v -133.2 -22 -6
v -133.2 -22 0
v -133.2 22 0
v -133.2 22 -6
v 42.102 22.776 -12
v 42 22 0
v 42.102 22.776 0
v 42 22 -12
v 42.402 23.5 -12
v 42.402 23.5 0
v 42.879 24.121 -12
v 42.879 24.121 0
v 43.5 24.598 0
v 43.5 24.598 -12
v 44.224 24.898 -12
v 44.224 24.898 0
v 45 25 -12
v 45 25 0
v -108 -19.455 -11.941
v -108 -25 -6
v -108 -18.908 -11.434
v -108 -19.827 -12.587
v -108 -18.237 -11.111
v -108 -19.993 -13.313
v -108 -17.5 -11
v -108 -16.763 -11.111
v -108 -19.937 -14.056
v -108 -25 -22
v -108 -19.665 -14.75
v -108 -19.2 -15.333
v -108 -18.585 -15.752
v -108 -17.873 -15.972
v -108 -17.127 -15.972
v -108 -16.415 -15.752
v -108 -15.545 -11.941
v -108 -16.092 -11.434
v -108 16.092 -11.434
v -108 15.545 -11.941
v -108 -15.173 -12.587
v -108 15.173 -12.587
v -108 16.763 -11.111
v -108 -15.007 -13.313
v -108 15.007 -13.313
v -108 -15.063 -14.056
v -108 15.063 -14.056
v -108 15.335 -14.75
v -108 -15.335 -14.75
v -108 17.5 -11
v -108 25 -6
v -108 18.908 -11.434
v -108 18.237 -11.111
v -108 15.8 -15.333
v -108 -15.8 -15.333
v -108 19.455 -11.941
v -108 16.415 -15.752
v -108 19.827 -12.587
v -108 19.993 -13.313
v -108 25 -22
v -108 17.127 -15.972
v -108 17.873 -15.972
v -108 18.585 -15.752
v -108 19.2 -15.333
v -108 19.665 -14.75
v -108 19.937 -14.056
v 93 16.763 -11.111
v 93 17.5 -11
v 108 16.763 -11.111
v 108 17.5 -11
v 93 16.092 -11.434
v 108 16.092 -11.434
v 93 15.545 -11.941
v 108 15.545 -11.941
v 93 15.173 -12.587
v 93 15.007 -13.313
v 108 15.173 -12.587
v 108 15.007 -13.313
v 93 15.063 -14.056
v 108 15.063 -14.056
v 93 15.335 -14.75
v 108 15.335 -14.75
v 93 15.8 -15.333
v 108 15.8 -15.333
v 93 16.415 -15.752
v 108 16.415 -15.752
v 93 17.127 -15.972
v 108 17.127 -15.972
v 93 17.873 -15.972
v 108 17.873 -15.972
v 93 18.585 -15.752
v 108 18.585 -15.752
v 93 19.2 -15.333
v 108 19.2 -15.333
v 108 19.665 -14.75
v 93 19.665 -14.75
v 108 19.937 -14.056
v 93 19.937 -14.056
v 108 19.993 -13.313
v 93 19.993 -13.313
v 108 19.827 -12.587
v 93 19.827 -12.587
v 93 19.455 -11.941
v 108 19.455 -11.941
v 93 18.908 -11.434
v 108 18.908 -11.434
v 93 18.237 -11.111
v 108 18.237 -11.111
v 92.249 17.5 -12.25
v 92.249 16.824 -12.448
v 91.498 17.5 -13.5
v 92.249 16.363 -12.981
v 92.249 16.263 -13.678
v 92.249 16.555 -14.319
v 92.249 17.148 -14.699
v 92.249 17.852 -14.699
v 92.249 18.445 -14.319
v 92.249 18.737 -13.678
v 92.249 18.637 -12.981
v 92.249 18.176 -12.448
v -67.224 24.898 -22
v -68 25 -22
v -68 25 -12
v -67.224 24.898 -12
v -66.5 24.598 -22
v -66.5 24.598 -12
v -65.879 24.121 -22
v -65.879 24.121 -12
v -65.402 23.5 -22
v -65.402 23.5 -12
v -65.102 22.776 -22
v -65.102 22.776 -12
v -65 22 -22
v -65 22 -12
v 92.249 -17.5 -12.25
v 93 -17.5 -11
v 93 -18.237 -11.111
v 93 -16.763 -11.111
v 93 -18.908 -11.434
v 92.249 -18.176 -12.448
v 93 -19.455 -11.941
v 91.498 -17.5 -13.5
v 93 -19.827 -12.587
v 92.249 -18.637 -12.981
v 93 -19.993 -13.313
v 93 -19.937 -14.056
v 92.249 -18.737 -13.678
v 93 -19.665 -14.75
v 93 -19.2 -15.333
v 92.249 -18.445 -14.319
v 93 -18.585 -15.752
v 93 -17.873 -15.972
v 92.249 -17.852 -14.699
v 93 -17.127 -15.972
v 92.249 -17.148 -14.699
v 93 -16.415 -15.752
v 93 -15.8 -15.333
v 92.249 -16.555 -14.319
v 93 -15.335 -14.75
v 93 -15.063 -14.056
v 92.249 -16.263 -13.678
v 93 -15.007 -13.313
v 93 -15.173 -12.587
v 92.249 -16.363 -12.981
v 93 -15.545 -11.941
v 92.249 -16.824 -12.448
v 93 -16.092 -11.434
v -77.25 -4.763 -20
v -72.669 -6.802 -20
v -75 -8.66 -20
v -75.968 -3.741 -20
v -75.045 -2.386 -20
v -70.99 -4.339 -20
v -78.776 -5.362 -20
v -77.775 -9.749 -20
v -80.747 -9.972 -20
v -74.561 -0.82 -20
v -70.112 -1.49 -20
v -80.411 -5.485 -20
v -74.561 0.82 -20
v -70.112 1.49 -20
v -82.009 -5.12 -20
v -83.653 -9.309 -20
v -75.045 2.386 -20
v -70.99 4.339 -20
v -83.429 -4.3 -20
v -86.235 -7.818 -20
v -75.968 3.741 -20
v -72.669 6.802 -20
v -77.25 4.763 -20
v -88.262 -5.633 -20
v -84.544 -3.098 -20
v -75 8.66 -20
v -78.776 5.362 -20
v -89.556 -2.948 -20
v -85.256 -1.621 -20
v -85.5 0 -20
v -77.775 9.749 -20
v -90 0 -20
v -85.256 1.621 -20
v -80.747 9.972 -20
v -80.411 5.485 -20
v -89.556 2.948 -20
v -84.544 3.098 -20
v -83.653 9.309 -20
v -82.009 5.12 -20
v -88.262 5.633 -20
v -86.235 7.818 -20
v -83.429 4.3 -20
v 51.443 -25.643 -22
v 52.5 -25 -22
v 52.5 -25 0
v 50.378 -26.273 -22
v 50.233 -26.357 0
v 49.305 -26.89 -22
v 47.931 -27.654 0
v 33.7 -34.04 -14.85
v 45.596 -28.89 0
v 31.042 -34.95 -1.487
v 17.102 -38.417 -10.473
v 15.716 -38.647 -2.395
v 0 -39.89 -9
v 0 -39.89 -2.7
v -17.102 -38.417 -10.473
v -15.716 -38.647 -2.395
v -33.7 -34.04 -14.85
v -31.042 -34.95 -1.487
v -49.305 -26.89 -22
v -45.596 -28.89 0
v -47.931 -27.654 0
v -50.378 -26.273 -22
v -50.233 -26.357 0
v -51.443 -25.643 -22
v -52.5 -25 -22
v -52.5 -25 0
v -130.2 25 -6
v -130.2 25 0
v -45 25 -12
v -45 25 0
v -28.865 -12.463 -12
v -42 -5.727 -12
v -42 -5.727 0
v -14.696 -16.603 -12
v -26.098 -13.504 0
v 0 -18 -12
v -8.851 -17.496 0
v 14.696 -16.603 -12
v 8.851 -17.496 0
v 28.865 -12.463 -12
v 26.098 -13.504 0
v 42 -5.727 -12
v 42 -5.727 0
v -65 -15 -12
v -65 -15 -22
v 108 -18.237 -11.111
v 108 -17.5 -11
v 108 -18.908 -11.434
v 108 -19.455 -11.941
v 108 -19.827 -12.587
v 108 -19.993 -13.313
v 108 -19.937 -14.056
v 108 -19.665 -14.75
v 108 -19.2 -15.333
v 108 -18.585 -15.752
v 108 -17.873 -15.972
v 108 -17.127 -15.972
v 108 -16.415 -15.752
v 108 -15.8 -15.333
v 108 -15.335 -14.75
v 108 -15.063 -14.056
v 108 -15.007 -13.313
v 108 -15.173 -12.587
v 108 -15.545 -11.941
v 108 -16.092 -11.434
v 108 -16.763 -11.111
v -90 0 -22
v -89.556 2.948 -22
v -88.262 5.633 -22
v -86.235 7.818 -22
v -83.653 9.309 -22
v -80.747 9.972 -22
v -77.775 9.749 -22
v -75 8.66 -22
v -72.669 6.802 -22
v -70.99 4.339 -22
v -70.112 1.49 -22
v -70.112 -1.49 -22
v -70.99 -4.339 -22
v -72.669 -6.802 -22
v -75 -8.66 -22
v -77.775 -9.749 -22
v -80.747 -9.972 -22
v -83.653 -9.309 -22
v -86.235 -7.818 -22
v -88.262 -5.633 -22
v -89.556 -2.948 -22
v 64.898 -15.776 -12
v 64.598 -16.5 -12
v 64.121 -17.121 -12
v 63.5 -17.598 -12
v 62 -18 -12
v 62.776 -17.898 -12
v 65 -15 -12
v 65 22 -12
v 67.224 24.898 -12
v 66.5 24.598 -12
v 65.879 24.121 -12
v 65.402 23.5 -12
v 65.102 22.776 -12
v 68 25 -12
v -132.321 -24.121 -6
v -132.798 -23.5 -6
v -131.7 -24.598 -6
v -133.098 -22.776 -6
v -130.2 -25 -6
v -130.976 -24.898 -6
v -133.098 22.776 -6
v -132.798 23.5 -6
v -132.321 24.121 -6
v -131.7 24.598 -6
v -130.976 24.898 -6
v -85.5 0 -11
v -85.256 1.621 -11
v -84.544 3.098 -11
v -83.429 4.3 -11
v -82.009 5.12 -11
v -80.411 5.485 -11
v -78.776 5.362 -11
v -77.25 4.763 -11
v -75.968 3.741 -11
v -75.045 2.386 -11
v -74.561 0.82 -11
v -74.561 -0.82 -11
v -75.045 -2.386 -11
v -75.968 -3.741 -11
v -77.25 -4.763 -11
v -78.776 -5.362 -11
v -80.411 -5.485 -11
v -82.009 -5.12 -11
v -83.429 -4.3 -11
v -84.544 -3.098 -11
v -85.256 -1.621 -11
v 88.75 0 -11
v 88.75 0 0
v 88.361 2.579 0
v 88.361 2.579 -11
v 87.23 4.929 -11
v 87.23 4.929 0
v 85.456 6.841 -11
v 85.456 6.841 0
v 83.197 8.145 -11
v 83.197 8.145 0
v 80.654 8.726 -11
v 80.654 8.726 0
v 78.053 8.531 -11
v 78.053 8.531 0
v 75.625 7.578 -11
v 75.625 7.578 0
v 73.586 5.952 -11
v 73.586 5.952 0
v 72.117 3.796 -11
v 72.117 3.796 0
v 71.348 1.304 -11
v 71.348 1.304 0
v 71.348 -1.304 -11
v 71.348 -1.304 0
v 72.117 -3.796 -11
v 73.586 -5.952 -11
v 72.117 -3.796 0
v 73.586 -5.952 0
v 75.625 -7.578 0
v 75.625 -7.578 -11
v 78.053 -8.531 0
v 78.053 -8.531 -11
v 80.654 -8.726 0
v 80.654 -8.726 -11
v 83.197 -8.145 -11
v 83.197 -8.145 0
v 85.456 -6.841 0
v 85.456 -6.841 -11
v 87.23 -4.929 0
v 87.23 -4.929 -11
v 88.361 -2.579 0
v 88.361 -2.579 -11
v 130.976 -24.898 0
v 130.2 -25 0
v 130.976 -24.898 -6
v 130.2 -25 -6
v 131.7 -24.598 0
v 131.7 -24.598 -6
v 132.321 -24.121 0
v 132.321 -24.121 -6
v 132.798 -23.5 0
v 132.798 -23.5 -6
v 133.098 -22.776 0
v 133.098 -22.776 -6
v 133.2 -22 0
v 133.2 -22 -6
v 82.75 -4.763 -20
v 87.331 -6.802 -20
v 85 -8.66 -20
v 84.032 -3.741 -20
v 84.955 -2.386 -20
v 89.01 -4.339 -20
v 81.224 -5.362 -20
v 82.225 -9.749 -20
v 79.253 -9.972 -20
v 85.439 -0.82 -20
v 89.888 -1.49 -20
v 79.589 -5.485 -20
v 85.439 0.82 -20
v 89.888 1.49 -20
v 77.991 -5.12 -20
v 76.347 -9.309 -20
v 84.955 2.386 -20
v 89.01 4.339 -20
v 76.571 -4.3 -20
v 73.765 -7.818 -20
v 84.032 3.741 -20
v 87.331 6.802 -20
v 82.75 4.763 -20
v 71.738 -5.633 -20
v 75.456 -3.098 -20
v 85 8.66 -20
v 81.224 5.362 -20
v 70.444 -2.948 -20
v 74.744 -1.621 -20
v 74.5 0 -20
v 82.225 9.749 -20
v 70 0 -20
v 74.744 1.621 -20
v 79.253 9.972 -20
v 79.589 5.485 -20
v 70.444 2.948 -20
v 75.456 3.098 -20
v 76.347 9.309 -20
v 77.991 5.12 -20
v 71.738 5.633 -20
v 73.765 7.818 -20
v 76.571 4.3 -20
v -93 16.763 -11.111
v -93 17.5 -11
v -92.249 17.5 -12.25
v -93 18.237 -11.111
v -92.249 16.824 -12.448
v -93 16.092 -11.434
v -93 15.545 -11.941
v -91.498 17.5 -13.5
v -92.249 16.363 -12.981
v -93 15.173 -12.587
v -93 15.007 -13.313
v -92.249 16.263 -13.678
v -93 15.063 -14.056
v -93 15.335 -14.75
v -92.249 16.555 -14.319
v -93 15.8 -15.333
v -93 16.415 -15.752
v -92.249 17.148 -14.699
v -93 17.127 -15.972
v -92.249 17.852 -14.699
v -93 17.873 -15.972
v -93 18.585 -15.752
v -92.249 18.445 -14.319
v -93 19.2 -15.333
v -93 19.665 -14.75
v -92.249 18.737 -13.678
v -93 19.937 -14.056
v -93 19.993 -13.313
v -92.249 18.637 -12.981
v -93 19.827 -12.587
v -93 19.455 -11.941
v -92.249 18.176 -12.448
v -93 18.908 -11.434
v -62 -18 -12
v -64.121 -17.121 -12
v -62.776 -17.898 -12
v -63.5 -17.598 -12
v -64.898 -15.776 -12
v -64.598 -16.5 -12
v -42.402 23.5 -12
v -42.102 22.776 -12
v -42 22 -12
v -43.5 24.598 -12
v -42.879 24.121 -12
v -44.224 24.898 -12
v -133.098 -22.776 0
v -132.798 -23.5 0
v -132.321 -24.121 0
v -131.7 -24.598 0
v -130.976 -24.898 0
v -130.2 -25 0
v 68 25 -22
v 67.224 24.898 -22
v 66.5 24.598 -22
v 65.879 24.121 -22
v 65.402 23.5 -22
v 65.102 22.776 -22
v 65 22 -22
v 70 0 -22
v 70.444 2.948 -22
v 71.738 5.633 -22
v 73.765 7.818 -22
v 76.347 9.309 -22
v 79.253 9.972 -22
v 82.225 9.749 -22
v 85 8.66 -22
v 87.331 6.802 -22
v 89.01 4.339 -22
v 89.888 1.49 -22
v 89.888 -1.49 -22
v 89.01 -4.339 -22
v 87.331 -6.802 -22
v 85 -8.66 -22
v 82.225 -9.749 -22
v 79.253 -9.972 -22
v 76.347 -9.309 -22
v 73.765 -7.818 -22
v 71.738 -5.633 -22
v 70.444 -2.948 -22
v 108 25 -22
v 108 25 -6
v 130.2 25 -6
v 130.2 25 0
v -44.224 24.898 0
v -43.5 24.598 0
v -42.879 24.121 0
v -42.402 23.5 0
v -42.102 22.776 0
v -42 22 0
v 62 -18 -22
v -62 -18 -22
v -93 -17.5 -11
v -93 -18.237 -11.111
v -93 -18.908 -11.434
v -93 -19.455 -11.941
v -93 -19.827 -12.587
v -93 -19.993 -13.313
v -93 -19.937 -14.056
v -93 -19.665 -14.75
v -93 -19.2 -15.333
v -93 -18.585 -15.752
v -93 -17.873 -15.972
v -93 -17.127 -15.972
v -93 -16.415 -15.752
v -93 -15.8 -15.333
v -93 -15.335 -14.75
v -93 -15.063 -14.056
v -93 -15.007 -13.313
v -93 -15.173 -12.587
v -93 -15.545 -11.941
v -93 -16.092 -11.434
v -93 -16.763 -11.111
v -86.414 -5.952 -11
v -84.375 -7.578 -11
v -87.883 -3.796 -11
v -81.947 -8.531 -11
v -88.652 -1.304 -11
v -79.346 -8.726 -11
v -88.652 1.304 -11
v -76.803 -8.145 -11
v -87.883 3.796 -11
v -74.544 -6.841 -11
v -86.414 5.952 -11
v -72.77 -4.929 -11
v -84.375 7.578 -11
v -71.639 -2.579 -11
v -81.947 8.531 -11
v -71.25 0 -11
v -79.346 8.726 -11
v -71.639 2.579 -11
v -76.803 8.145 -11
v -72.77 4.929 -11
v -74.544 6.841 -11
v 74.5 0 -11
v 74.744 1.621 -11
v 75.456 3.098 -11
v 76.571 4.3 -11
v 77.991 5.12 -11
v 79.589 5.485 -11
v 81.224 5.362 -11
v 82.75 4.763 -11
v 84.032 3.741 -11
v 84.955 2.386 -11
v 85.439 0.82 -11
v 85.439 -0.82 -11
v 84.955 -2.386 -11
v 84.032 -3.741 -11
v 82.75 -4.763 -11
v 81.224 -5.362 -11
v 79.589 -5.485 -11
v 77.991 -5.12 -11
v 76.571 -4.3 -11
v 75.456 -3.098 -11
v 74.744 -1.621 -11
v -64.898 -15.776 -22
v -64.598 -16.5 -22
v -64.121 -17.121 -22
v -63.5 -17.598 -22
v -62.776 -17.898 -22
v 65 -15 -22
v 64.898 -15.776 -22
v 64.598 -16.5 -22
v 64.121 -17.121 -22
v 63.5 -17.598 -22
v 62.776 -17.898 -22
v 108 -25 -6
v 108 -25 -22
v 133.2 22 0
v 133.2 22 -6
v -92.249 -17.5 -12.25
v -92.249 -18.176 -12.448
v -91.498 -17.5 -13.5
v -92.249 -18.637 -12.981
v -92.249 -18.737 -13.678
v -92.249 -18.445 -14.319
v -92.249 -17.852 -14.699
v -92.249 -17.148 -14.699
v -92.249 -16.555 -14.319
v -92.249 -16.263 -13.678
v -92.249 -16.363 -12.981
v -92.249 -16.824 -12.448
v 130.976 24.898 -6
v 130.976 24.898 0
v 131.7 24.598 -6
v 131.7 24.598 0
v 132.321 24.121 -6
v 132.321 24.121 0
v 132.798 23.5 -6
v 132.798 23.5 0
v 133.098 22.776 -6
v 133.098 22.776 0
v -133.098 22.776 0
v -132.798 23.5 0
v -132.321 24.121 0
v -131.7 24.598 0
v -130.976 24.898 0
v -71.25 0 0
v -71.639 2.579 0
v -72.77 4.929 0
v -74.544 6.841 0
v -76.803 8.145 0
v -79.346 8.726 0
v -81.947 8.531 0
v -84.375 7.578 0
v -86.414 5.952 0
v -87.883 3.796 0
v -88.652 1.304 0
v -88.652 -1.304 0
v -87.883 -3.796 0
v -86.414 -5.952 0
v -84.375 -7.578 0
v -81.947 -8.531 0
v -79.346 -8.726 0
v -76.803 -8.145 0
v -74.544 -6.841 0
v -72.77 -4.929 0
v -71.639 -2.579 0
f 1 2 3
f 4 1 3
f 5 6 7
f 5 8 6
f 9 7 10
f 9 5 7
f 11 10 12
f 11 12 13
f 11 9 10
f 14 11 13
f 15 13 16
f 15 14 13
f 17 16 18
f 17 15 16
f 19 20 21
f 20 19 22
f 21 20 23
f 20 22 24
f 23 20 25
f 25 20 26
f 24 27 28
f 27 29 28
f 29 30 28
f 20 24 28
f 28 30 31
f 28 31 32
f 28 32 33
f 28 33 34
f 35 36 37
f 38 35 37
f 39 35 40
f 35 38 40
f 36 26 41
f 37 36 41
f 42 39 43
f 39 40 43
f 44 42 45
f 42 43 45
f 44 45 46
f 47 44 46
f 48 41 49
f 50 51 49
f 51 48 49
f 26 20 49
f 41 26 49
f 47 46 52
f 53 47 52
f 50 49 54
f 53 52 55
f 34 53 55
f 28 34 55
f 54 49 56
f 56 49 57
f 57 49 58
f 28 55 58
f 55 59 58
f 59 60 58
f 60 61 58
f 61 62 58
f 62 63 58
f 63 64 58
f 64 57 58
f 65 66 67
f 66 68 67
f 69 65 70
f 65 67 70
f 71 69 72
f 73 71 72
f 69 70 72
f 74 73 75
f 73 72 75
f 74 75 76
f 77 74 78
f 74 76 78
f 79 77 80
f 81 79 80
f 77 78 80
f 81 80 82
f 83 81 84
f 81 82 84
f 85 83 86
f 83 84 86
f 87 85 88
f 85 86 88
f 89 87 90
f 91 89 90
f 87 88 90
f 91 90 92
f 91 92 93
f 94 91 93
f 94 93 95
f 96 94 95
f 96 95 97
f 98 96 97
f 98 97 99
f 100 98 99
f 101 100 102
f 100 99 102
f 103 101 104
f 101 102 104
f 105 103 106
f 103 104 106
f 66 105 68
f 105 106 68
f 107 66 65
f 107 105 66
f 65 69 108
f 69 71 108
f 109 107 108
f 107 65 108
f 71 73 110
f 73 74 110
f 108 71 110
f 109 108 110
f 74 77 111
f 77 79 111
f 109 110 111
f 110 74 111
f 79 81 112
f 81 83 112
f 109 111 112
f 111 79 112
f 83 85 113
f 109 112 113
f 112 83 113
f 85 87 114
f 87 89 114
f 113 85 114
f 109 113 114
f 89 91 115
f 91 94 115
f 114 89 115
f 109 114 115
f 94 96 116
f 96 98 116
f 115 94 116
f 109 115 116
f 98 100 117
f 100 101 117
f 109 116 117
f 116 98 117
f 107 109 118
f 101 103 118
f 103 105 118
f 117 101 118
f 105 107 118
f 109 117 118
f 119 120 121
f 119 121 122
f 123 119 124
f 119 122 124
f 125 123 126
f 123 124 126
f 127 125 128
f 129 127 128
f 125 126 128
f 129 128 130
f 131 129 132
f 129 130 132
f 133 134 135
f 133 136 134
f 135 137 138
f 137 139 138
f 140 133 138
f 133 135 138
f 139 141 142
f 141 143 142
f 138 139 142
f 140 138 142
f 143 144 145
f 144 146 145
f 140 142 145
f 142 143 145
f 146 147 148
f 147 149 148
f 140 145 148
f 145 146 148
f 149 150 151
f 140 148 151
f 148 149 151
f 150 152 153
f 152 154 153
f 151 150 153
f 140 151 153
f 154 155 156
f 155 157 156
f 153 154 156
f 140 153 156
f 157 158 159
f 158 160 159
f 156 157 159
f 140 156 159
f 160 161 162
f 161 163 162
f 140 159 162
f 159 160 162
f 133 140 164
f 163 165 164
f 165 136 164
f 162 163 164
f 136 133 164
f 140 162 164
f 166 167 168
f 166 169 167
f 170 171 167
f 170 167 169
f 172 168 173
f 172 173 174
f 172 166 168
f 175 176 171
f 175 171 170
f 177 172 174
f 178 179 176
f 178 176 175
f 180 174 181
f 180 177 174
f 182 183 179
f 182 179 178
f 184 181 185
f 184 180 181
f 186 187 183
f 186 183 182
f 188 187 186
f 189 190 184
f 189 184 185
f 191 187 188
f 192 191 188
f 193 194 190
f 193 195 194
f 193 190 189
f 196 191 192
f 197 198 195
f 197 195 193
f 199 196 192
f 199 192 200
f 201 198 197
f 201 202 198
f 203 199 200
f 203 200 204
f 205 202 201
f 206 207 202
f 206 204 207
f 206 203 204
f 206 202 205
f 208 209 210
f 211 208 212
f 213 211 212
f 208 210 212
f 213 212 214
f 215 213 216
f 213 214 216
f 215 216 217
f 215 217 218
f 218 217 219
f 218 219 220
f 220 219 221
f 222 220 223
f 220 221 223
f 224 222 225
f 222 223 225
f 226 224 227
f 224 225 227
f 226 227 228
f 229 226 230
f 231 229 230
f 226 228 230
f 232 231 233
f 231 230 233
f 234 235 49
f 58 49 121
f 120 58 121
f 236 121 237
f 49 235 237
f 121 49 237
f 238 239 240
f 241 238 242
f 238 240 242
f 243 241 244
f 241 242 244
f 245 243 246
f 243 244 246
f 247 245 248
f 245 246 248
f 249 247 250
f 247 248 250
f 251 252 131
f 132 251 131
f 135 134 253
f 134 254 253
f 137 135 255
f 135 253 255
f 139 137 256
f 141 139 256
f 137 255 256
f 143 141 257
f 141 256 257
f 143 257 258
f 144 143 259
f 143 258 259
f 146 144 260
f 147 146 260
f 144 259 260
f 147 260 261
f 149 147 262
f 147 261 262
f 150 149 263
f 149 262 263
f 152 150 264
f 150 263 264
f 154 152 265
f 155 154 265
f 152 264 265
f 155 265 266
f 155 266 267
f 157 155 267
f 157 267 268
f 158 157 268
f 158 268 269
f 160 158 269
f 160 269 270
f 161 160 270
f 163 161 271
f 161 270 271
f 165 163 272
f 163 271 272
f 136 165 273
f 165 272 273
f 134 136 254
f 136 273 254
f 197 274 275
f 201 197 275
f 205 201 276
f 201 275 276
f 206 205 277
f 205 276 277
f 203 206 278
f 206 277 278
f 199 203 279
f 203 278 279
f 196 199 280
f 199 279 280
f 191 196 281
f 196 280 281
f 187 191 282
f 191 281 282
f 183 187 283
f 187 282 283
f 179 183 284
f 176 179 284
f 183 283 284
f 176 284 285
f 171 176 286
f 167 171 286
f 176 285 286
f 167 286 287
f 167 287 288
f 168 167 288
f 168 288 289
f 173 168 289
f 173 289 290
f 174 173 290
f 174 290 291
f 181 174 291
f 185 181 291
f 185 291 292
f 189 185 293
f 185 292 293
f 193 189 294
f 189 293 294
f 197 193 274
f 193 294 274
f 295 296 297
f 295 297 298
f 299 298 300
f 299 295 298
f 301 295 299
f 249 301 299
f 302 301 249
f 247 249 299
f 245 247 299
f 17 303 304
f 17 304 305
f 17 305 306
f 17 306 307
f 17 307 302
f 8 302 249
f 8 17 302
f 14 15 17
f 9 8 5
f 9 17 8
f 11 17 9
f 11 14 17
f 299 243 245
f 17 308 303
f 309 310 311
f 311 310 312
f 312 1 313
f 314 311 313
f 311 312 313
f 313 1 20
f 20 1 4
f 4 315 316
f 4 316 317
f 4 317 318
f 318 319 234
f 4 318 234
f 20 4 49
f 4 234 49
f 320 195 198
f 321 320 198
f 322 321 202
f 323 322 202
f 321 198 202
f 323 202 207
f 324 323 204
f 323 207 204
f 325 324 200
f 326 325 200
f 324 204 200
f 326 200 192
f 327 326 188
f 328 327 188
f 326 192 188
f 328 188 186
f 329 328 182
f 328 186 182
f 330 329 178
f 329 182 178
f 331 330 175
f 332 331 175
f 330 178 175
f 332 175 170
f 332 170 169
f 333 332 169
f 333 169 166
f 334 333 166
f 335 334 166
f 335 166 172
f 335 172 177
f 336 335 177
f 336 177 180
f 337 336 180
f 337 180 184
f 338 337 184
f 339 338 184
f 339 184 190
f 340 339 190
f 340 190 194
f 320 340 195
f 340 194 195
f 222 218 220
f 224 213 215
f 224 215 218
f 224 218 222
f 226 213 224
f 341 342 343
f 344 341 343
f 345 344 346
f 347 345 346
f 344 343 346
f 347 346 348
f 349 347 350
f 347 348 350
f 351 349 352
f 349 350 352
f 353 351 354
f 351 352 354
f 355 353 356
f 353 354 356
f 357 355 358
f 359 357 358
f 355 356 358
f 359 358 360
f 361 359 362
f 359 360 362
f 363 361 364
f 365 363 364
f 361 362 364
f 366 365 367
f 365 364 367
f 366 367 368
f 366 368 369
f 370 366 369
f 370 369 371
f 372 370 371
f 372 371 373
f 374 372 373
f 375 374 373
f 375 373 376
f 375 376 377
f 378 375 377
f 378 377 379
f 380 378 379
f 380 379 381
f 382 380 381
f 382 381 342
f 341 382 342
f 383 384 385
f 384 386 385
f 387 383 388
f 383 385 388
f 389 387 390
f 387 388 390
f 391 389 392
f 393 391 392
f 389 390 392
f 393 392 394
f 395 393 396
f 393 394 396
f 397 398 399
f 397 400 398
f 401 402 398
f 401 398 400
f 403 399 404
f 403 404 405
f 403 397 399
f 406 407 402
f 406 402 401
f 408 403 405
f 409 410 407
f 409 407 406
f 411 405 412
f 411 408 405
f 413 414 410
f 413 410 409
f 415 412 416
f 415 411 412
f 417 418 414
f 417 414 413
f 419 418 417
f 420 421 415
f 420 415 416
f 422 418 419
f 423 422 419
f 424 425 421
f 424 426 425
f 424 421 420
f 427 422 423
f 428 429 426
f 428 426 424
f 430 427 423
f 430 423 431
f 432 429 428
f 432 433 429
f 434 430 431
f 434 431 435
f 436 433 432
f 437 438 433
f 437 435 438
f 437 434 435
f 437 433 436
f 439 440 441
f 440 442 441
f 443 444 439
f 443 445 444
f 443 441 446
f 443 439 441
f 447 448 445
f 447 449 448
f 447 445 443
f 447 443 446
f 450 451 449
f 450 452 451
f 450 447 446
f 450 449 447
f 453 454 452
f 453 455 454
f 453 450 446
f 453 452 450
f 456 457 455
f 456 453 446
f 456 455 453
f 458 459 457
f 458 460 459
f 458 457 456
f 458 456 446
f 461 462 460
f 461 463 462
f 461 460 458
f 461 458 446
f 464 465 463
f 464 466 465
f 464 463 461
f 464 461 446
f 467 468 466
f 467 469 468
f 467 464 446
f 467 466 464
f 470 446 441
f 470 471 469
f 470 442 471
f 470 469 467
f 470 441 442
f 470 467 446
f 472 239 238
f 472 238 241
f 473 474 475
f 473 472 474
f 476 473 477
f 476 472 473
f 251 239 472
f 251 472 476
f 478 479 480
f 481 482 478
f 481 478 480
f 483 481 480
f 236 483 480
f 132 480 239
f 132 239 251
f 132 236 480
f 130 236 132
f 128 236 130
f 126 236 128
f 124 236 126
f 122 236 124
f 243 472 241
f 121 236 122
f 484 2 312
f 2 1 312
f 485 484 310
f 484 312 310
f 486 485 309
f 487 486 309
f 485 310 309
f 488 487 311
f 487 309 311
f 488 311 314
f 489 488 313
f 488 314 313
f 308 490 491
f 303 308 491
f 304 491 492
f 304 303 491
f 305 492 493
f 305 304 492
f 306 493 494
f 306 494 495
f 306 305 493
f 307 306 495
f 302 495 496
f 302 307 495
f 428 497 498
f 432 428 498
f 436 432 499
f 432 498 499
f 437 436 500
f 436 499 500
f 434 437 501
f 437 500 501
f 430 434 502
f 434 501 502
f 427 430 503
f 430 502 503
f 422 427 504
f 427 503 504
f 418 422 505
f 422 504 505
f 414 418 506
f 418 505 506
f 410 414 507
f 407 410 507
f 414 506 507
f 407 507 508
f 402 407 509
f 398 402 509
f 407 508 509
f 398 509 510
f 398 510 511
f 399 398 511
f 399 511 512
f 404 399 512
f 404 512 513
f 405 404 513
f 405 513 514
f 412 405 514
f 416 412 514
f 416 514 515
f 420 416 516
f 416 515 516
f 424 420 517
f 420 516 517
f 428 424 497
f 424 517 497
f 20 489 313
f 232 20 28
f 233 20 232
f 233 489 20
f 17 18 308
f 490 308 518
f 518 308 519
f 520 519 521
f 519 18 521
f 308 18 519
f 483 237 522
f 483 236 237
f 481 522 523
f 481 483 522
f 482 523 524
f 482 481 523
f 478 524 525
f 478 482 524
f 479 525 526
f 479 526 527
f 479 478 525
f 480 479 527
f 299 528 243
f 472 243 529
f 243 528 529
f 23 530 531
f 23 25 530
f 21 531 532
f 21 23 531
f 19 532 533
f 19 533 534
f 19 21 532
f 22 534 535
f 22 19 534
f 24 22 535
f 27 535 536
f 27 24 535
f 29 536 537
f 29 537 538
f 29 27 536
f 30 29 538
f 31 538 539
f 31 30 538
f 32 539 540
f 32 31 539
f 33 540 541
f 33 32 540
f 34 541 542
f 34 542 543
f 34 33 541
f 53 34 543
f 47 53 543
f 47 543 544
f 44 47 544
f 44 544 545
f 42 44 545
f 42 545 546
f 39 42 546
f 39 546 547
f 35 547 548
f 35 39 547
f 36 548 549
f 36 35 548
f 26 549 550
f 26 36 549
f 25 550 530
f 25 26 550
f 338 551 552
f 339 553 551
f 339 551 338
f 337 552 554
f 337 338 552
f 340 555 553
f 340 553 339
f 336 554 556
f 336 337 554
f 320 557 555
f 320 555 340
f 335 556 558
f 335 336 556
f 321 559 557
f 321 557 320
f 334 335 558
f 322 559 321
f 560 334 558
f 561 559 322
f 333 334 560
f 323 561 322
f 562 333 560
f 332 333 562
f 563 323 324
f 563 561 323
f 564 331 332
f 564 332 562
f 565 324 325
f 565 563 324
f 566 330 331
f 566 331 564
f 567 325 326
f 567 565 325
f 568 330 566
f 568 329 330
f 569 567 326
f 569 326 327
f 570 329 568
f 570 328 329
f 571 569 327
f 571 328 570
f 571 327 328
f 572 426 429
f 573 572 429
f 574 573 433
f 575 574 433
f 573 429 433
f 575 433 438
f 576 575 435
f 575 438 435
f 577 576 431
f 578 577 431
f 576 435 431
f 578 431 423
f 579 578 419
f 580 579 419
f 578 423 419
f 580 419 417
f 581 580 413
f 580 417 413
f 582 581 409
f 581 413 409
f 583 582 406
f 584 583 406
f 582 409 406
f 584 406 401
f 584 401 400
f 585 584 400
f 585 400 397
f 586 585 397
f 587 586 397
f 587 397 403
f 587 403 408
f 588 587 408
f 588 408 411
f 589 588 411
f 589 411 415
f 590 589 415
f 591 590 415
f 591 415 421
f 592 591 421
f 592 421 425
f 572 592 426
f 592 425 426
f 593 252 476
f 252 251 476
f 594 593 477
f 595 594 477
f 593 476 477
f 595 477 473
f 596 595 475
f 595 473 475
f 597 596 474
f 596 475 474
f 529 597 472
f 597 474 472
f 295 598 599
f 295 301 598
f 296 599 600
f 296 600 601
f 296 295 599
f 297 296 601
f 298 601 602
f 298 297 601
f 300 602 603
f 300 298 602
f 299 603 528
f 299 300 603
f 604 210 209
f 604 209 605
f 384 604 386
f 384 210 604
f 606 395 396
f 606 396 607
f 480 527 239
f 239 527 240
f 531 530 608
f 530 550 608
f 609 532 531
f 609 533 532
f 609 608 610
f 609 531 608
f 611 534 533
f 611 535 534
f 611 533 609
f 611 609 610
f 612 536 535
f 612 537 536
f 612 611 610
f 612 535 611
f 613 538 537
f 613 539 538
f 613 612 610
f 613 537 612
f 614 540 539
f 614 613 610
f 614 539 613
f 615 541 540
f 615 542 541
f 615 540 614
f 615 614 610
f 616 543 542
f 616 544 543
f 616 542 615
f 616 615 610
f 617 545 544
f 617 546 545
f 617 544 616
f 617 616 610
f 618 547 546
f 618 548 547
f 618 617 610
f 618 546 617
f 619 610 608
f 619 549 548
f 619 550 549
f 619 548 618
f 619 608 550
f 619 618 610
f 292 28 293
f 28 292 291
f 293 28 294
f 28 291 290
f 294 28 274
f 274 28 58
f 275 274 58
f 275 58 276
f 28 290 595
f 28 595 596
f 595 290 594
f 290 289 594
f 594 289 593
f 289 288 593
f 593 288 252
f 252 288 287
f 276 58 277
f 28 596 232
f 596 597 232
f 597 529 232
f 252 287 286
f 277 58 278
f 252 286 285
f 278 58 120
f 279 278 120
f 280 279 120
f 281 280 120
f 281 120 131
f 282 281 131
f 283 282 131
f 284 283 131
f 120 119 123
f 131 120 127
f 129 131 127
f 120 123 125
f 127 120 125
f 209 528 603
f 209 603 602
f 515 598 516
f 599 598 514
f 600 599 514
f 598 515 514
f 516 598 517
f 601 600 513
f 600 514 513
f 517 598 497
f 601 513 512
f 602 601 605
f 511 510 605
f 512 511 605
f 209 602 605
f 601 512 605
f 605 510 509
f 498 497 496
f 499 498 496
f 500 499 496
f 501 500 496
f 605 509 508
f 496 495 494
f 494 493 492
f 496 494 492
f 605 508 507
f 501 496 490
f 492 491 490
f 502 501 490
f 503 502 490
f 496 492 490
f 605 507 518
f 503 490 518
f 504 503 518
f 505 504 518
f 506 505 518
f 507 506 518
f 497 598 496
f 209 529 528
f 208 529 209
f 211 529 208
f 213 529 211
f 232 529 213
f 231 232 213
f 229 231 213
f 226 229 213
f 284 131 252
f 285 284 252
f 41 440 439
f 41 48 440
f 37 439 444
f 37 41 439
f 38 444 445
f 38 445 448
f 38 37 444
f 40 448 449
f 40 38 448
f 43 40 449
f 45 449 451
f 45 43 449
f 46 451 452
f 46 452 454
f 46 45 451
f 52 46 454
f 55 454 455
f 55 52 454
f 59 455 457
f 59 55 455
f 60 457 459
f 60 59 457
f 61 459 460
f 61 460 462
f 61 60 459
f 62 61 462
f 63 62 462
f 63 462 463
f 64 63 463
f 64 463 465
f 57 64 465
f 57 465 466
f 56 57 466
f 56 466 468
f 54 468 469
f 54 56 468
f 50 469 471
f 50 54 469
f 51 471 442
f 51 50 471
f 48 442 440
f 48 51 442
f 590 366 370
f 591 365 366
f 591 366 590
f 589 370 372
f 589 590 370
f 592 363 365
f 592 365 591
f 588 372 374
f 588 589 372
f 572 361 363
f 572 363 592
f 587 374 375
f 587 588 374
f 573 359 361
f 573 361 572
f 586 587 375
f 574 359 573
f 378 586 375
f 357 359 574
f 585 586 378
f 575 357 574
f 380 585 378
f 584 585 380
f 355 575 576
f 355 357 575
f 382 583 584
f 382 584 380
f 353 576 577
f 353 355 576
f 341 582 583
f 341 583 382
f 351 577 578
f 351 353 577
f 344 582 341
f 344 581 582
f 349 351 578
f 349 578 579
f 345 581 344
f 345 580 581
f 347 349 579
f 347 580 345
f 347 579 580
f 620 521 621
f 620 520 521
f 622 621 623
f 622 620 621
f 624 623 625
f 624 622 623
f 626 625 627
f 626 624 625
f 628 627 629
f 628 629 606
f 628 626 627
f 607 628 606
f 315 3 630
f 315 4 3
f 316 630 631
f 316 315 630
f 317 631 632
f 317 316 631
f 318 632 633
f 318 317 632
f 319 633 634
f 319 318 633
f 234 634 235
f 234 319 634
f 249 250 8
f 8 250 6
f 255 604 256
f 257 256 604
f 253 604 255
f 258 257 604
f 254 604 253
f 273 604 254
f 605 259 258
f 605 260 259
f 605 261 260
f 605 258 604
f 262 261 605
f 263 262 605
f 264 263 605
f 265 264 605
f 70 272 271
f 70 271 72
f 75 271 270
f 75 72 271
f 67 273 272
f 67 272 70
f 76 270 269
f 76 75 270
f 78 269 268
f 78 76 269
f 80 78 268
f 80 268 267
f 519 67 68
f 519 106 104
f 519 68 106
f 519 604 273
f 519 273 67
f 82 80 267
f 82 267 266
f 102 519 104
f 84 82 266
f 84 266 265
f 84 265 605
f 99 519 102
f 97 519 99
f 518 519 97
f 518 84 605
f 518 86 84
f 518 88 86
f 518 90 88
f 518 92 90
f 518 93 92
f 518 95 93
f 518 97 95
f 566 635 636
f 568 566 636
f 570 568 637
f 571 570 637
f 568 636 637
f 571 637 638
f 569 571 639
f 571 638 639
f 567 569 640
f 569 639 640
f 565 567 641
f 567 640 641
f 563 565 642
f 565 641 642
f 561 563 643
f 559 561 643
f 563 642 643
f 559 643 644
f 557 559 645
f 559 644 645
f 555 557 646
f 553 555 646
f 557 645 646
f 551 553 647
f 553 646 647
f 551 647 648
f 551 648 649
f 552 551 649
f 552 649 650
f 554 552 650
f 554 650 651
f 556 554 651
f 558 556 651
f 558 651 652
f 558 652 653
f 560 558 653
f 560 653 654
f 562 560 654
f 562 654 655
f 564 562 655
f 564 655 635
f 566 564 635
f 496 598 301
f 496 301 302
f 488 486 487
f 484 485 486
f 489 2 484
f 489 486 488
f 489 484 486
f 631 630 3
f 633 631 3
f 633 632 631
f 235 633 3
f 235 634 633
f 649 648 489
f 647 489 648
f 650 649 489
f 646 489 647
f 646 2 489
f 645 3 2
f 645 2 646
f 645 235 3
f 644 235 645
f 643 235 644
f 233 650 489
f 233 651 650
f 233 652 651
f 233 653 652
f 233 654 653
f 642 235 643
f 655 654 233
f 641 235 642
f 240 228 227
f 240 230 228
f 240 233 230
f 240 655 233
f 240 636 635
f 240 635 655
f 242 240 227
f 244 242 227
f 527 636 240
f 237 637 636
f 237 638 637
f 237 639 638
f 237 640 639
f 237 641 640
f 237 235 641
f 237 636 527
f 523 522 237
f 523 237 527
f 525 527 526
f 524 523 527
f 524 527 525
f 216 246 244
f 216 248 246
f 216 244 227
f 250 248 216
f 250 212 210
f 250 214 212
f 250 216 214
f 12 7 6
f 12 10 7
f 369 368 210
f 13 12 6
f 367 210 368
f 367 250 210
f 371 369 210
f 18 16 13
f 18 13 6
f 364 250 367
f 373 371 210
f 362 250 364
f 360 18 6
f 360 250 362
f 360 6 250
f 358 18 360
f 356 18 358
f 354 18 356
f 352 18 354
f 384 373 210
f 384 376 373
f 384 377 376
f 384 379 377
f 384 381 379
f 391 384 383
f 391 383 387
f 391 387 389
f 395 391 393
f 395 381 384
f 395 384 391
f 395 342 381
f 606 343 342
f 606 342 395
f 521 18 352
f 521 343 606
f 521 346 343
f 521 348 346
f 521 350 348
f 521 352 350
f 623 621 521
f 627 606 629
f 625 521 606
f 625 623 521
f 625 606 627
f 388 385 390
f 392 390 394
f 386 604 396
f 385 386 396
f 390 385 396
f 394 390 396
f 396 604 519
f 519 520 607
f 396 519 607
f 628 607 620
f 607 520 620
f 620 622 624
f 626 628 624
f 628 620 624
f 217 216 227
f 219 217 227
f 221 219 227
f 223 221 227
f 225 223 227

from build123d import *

# Parameters (mm, degrees)
SKETCH_1_W                = 266.4
SKETCH_1_H                = 50
EXTRUDE_1_DEPTH           = 22
SKETCH_2_W                = 25.2
SKETCH_2_H                = 16
CUT_EXTRUDE_1_DEPTH       = 144.966107122
SKETCH_5_W                = 130
SKETCH_5_H                = 43
CUT_EXTRUDE_4_DEPTH       = 10
CUT_EXTRUDE_2_DEPTH       = 138.299817917
EXTRUDE_2_DEPTH           = 22
CUT_EXTRUDE_5_DEPTH       = 250
HOLE_WIZARD_1_D           = 11
HOLE_WIZARD_1_DEPTH       = 100
HOLE_WIZARD_1_CBORE_D     = 17.5
HOLE_WIZARD_1_CBORE_DEPTH = 11
SKETCH_10_R               = 10
CUT_EXTRUDE_6_DEPTH       = 2
M6X1_0_1_AT_2_COUNT       = 2
M6X1_0_1_AT_2_PITCH       = 35
FILLET_1_R                = 3


with BuildPart() as part:
    # 草图1 → 凸台-拉伸1 (new body)
    with BuildSketch(Plane.XY):
        Rectangle(SKETCH_1_W, SKETCH_1_H)
    extrude(amount=-EXTRUDE_1_DEPTH)

    # 草图2 → 切除-拉伸1 (cut, through all)
    with BuildSketch(Plane(origin=(0, 25, 0), x_dir=(1, 0, 0), z_dir=(0, 1, 0))):
        with Locations((-120.6, 14)):
            Rectangle(SKETCH_2_W, SKETCH_2_H)
        with Locations((120.6, 14)):
            Rectangle(SKETCH_2_W, SKETCH_2_H)
    extrude(amount=-CUT_EXTRUDE_1_DEPTH, mode=Mode.SUBTRACT)

    # 草图5 → 切除-拉伸4 (cut)
    with BuildSketch(Plane(origin=(0, 0, -22), x_dir=(-1, 0, 0), z_dir=(0, 0, -1))):
        with Locations((0, 3.5)):
            Rectangle(SKETCH_5_W, SKETCH_5_H)
    extrude(amount=-CUT_EXTRUDE_4_DEPTH, mode=Mode.SUBTRACT)

    # 草图3 → 切除-拉伸2 (cut, through all)
    with BuildSketch(Plane.XY):
        with BuildLine():
            Line((-42, 25), (-42, -5.726706901))
            ThreePointArc((-42, -5.726706901), (0, -18), (42, -5.726706901))
            Line((42, -5.726706901), (42, 25))
            Line((42, 25), (-42, 25))
        make_face()
    extrude(amount=-CUT_EXTRUDE_2_DEPTH, mode=Mode.SUBTRACT)

    # 草图6 → 凸台-拉伸2 (add)
    with BuildSketch(Plane.XY):
        with BuildLine():
            Line((-52.5, -25), (52.5, -25))
            ThreePointArc((52.5, -25), (0, -39.889777347), (-52.5, -25))
        make_face()
    extrude(amount=-EXTRUDE_2_DEPTH)

    # 草图7 → 切除-拉伸5 (cut, symmetric)
    with BuildSketch(Plane(origin=(0, 0, 0), x_dir=(0, 0, -1), z_dir=(1, 0, 0))):
        Polygon((22, -39.889777347), (22, -26.889777347), (9, -39.889777347), align=None)
        Polygon((0, -39.889777347), (2.7, -39.889777347), (0, -28.889777347), align=None)
    extrude(amount=CUT_EXTRUDE_5_DEPTH, both=True, mode=Mode.SUBTRACT)

    # 孔1
    with Locations(Plane.XY):
        with Locations((80, 0), (-80, 0)):
            CounterBoreHole(HOLE_WIZARD_1_D / 2, HOLE_WIZARD_1_CBORE_D / 2, HOLE_WIZARD_1_CBORE_DEPTH, depth=HOLE_WIZARD_1_DEPTH)

    # 草图10 → 切除-拉伸6 (cut)
    with BuildSketch(Plane(origin=(0, 0, -22), x_dir=(-1, 0, 0), z_dir=(0, 0, -1))):
        with Locations((80, 0)):
            Circle(SKETCH_10_R)
        with Locations((-80, 0)):
            Circle(SKETCH_10_R)
    extrude(amount=-CUT_EXTRUDE_6_DEPTH, mode=Mode.SUBTRACT)

    # 草图11 → M6x1.0 螺纹孔1 (revolve, cut)
    with BuildSketch(Plane(origin=(-108, -17.5, -13.5), x_dir=(0, 0, 1), z_dir=(0, 1, 0))):
        Polygon((0, 0), (0, 16.502151548), (2.5, 15), (2.5, 0), align=None)
    m6x1_0_1 = revolve(axis=Axis((-114.35, -17.5, -13.5), (1, 0, 0)), mode=Mode.SUBTRACT)

    # M6x1.0 螺纹孔1 at 2: M6x1.0 螺纹孔1 ×2
    with Locations(*[(0, i * M6X1_0_1_AT_2_PITCH, 0) for i in range(1, M6X1_0_1_AT_2_COUNT)]):
        add(m6x1_0_1, mode=Mode.SUBTRACT)

    # 镜向1: M6x1.0 螺纹孔1 across plane
    add(m6x1_0_1.mirror(Plane(origin=(0, 0, 0), x_dir=(0, 0, 1), z_dir=(1, 0, 0))), mode=Mode.SUBTRACT)

    # 镜向1 copy 1 sketch → 镜向1 copy 1 (revolve, cut)
    with BuildSketch(Plane(origin=(108, 17.5, -13.5), x_dir=(0, 0, 1), z_dir=(0, 1, 0))):
        Polygon((0, 0), (0, -16.502151548), (2.5, -15), (2.5, 0), align=None)
    revolve(axis=Axis((114.35, 17.5, -13.5), (1, 0, 0)), mode=Mode.SUBTRACT)

    # 圆角1
    fillet_1_edges = [part.edges().sort_by_distance(p)[0] for p in [
        (-133.2, -25, -3),
        (-133.2, 25, -3),
        (133.2, -25, -3),
        (133.2, 25, -3),
        (65, -18, -17),
        (65, 25, -17),
        (-65, 25, -17),
        (-65, -18, -17),
        (-42, 25, -6),
        (42, 25, -6),
    ]]
    fillet(fillet_1_edges, radius=FILLET_1_R)


solid = part.part
